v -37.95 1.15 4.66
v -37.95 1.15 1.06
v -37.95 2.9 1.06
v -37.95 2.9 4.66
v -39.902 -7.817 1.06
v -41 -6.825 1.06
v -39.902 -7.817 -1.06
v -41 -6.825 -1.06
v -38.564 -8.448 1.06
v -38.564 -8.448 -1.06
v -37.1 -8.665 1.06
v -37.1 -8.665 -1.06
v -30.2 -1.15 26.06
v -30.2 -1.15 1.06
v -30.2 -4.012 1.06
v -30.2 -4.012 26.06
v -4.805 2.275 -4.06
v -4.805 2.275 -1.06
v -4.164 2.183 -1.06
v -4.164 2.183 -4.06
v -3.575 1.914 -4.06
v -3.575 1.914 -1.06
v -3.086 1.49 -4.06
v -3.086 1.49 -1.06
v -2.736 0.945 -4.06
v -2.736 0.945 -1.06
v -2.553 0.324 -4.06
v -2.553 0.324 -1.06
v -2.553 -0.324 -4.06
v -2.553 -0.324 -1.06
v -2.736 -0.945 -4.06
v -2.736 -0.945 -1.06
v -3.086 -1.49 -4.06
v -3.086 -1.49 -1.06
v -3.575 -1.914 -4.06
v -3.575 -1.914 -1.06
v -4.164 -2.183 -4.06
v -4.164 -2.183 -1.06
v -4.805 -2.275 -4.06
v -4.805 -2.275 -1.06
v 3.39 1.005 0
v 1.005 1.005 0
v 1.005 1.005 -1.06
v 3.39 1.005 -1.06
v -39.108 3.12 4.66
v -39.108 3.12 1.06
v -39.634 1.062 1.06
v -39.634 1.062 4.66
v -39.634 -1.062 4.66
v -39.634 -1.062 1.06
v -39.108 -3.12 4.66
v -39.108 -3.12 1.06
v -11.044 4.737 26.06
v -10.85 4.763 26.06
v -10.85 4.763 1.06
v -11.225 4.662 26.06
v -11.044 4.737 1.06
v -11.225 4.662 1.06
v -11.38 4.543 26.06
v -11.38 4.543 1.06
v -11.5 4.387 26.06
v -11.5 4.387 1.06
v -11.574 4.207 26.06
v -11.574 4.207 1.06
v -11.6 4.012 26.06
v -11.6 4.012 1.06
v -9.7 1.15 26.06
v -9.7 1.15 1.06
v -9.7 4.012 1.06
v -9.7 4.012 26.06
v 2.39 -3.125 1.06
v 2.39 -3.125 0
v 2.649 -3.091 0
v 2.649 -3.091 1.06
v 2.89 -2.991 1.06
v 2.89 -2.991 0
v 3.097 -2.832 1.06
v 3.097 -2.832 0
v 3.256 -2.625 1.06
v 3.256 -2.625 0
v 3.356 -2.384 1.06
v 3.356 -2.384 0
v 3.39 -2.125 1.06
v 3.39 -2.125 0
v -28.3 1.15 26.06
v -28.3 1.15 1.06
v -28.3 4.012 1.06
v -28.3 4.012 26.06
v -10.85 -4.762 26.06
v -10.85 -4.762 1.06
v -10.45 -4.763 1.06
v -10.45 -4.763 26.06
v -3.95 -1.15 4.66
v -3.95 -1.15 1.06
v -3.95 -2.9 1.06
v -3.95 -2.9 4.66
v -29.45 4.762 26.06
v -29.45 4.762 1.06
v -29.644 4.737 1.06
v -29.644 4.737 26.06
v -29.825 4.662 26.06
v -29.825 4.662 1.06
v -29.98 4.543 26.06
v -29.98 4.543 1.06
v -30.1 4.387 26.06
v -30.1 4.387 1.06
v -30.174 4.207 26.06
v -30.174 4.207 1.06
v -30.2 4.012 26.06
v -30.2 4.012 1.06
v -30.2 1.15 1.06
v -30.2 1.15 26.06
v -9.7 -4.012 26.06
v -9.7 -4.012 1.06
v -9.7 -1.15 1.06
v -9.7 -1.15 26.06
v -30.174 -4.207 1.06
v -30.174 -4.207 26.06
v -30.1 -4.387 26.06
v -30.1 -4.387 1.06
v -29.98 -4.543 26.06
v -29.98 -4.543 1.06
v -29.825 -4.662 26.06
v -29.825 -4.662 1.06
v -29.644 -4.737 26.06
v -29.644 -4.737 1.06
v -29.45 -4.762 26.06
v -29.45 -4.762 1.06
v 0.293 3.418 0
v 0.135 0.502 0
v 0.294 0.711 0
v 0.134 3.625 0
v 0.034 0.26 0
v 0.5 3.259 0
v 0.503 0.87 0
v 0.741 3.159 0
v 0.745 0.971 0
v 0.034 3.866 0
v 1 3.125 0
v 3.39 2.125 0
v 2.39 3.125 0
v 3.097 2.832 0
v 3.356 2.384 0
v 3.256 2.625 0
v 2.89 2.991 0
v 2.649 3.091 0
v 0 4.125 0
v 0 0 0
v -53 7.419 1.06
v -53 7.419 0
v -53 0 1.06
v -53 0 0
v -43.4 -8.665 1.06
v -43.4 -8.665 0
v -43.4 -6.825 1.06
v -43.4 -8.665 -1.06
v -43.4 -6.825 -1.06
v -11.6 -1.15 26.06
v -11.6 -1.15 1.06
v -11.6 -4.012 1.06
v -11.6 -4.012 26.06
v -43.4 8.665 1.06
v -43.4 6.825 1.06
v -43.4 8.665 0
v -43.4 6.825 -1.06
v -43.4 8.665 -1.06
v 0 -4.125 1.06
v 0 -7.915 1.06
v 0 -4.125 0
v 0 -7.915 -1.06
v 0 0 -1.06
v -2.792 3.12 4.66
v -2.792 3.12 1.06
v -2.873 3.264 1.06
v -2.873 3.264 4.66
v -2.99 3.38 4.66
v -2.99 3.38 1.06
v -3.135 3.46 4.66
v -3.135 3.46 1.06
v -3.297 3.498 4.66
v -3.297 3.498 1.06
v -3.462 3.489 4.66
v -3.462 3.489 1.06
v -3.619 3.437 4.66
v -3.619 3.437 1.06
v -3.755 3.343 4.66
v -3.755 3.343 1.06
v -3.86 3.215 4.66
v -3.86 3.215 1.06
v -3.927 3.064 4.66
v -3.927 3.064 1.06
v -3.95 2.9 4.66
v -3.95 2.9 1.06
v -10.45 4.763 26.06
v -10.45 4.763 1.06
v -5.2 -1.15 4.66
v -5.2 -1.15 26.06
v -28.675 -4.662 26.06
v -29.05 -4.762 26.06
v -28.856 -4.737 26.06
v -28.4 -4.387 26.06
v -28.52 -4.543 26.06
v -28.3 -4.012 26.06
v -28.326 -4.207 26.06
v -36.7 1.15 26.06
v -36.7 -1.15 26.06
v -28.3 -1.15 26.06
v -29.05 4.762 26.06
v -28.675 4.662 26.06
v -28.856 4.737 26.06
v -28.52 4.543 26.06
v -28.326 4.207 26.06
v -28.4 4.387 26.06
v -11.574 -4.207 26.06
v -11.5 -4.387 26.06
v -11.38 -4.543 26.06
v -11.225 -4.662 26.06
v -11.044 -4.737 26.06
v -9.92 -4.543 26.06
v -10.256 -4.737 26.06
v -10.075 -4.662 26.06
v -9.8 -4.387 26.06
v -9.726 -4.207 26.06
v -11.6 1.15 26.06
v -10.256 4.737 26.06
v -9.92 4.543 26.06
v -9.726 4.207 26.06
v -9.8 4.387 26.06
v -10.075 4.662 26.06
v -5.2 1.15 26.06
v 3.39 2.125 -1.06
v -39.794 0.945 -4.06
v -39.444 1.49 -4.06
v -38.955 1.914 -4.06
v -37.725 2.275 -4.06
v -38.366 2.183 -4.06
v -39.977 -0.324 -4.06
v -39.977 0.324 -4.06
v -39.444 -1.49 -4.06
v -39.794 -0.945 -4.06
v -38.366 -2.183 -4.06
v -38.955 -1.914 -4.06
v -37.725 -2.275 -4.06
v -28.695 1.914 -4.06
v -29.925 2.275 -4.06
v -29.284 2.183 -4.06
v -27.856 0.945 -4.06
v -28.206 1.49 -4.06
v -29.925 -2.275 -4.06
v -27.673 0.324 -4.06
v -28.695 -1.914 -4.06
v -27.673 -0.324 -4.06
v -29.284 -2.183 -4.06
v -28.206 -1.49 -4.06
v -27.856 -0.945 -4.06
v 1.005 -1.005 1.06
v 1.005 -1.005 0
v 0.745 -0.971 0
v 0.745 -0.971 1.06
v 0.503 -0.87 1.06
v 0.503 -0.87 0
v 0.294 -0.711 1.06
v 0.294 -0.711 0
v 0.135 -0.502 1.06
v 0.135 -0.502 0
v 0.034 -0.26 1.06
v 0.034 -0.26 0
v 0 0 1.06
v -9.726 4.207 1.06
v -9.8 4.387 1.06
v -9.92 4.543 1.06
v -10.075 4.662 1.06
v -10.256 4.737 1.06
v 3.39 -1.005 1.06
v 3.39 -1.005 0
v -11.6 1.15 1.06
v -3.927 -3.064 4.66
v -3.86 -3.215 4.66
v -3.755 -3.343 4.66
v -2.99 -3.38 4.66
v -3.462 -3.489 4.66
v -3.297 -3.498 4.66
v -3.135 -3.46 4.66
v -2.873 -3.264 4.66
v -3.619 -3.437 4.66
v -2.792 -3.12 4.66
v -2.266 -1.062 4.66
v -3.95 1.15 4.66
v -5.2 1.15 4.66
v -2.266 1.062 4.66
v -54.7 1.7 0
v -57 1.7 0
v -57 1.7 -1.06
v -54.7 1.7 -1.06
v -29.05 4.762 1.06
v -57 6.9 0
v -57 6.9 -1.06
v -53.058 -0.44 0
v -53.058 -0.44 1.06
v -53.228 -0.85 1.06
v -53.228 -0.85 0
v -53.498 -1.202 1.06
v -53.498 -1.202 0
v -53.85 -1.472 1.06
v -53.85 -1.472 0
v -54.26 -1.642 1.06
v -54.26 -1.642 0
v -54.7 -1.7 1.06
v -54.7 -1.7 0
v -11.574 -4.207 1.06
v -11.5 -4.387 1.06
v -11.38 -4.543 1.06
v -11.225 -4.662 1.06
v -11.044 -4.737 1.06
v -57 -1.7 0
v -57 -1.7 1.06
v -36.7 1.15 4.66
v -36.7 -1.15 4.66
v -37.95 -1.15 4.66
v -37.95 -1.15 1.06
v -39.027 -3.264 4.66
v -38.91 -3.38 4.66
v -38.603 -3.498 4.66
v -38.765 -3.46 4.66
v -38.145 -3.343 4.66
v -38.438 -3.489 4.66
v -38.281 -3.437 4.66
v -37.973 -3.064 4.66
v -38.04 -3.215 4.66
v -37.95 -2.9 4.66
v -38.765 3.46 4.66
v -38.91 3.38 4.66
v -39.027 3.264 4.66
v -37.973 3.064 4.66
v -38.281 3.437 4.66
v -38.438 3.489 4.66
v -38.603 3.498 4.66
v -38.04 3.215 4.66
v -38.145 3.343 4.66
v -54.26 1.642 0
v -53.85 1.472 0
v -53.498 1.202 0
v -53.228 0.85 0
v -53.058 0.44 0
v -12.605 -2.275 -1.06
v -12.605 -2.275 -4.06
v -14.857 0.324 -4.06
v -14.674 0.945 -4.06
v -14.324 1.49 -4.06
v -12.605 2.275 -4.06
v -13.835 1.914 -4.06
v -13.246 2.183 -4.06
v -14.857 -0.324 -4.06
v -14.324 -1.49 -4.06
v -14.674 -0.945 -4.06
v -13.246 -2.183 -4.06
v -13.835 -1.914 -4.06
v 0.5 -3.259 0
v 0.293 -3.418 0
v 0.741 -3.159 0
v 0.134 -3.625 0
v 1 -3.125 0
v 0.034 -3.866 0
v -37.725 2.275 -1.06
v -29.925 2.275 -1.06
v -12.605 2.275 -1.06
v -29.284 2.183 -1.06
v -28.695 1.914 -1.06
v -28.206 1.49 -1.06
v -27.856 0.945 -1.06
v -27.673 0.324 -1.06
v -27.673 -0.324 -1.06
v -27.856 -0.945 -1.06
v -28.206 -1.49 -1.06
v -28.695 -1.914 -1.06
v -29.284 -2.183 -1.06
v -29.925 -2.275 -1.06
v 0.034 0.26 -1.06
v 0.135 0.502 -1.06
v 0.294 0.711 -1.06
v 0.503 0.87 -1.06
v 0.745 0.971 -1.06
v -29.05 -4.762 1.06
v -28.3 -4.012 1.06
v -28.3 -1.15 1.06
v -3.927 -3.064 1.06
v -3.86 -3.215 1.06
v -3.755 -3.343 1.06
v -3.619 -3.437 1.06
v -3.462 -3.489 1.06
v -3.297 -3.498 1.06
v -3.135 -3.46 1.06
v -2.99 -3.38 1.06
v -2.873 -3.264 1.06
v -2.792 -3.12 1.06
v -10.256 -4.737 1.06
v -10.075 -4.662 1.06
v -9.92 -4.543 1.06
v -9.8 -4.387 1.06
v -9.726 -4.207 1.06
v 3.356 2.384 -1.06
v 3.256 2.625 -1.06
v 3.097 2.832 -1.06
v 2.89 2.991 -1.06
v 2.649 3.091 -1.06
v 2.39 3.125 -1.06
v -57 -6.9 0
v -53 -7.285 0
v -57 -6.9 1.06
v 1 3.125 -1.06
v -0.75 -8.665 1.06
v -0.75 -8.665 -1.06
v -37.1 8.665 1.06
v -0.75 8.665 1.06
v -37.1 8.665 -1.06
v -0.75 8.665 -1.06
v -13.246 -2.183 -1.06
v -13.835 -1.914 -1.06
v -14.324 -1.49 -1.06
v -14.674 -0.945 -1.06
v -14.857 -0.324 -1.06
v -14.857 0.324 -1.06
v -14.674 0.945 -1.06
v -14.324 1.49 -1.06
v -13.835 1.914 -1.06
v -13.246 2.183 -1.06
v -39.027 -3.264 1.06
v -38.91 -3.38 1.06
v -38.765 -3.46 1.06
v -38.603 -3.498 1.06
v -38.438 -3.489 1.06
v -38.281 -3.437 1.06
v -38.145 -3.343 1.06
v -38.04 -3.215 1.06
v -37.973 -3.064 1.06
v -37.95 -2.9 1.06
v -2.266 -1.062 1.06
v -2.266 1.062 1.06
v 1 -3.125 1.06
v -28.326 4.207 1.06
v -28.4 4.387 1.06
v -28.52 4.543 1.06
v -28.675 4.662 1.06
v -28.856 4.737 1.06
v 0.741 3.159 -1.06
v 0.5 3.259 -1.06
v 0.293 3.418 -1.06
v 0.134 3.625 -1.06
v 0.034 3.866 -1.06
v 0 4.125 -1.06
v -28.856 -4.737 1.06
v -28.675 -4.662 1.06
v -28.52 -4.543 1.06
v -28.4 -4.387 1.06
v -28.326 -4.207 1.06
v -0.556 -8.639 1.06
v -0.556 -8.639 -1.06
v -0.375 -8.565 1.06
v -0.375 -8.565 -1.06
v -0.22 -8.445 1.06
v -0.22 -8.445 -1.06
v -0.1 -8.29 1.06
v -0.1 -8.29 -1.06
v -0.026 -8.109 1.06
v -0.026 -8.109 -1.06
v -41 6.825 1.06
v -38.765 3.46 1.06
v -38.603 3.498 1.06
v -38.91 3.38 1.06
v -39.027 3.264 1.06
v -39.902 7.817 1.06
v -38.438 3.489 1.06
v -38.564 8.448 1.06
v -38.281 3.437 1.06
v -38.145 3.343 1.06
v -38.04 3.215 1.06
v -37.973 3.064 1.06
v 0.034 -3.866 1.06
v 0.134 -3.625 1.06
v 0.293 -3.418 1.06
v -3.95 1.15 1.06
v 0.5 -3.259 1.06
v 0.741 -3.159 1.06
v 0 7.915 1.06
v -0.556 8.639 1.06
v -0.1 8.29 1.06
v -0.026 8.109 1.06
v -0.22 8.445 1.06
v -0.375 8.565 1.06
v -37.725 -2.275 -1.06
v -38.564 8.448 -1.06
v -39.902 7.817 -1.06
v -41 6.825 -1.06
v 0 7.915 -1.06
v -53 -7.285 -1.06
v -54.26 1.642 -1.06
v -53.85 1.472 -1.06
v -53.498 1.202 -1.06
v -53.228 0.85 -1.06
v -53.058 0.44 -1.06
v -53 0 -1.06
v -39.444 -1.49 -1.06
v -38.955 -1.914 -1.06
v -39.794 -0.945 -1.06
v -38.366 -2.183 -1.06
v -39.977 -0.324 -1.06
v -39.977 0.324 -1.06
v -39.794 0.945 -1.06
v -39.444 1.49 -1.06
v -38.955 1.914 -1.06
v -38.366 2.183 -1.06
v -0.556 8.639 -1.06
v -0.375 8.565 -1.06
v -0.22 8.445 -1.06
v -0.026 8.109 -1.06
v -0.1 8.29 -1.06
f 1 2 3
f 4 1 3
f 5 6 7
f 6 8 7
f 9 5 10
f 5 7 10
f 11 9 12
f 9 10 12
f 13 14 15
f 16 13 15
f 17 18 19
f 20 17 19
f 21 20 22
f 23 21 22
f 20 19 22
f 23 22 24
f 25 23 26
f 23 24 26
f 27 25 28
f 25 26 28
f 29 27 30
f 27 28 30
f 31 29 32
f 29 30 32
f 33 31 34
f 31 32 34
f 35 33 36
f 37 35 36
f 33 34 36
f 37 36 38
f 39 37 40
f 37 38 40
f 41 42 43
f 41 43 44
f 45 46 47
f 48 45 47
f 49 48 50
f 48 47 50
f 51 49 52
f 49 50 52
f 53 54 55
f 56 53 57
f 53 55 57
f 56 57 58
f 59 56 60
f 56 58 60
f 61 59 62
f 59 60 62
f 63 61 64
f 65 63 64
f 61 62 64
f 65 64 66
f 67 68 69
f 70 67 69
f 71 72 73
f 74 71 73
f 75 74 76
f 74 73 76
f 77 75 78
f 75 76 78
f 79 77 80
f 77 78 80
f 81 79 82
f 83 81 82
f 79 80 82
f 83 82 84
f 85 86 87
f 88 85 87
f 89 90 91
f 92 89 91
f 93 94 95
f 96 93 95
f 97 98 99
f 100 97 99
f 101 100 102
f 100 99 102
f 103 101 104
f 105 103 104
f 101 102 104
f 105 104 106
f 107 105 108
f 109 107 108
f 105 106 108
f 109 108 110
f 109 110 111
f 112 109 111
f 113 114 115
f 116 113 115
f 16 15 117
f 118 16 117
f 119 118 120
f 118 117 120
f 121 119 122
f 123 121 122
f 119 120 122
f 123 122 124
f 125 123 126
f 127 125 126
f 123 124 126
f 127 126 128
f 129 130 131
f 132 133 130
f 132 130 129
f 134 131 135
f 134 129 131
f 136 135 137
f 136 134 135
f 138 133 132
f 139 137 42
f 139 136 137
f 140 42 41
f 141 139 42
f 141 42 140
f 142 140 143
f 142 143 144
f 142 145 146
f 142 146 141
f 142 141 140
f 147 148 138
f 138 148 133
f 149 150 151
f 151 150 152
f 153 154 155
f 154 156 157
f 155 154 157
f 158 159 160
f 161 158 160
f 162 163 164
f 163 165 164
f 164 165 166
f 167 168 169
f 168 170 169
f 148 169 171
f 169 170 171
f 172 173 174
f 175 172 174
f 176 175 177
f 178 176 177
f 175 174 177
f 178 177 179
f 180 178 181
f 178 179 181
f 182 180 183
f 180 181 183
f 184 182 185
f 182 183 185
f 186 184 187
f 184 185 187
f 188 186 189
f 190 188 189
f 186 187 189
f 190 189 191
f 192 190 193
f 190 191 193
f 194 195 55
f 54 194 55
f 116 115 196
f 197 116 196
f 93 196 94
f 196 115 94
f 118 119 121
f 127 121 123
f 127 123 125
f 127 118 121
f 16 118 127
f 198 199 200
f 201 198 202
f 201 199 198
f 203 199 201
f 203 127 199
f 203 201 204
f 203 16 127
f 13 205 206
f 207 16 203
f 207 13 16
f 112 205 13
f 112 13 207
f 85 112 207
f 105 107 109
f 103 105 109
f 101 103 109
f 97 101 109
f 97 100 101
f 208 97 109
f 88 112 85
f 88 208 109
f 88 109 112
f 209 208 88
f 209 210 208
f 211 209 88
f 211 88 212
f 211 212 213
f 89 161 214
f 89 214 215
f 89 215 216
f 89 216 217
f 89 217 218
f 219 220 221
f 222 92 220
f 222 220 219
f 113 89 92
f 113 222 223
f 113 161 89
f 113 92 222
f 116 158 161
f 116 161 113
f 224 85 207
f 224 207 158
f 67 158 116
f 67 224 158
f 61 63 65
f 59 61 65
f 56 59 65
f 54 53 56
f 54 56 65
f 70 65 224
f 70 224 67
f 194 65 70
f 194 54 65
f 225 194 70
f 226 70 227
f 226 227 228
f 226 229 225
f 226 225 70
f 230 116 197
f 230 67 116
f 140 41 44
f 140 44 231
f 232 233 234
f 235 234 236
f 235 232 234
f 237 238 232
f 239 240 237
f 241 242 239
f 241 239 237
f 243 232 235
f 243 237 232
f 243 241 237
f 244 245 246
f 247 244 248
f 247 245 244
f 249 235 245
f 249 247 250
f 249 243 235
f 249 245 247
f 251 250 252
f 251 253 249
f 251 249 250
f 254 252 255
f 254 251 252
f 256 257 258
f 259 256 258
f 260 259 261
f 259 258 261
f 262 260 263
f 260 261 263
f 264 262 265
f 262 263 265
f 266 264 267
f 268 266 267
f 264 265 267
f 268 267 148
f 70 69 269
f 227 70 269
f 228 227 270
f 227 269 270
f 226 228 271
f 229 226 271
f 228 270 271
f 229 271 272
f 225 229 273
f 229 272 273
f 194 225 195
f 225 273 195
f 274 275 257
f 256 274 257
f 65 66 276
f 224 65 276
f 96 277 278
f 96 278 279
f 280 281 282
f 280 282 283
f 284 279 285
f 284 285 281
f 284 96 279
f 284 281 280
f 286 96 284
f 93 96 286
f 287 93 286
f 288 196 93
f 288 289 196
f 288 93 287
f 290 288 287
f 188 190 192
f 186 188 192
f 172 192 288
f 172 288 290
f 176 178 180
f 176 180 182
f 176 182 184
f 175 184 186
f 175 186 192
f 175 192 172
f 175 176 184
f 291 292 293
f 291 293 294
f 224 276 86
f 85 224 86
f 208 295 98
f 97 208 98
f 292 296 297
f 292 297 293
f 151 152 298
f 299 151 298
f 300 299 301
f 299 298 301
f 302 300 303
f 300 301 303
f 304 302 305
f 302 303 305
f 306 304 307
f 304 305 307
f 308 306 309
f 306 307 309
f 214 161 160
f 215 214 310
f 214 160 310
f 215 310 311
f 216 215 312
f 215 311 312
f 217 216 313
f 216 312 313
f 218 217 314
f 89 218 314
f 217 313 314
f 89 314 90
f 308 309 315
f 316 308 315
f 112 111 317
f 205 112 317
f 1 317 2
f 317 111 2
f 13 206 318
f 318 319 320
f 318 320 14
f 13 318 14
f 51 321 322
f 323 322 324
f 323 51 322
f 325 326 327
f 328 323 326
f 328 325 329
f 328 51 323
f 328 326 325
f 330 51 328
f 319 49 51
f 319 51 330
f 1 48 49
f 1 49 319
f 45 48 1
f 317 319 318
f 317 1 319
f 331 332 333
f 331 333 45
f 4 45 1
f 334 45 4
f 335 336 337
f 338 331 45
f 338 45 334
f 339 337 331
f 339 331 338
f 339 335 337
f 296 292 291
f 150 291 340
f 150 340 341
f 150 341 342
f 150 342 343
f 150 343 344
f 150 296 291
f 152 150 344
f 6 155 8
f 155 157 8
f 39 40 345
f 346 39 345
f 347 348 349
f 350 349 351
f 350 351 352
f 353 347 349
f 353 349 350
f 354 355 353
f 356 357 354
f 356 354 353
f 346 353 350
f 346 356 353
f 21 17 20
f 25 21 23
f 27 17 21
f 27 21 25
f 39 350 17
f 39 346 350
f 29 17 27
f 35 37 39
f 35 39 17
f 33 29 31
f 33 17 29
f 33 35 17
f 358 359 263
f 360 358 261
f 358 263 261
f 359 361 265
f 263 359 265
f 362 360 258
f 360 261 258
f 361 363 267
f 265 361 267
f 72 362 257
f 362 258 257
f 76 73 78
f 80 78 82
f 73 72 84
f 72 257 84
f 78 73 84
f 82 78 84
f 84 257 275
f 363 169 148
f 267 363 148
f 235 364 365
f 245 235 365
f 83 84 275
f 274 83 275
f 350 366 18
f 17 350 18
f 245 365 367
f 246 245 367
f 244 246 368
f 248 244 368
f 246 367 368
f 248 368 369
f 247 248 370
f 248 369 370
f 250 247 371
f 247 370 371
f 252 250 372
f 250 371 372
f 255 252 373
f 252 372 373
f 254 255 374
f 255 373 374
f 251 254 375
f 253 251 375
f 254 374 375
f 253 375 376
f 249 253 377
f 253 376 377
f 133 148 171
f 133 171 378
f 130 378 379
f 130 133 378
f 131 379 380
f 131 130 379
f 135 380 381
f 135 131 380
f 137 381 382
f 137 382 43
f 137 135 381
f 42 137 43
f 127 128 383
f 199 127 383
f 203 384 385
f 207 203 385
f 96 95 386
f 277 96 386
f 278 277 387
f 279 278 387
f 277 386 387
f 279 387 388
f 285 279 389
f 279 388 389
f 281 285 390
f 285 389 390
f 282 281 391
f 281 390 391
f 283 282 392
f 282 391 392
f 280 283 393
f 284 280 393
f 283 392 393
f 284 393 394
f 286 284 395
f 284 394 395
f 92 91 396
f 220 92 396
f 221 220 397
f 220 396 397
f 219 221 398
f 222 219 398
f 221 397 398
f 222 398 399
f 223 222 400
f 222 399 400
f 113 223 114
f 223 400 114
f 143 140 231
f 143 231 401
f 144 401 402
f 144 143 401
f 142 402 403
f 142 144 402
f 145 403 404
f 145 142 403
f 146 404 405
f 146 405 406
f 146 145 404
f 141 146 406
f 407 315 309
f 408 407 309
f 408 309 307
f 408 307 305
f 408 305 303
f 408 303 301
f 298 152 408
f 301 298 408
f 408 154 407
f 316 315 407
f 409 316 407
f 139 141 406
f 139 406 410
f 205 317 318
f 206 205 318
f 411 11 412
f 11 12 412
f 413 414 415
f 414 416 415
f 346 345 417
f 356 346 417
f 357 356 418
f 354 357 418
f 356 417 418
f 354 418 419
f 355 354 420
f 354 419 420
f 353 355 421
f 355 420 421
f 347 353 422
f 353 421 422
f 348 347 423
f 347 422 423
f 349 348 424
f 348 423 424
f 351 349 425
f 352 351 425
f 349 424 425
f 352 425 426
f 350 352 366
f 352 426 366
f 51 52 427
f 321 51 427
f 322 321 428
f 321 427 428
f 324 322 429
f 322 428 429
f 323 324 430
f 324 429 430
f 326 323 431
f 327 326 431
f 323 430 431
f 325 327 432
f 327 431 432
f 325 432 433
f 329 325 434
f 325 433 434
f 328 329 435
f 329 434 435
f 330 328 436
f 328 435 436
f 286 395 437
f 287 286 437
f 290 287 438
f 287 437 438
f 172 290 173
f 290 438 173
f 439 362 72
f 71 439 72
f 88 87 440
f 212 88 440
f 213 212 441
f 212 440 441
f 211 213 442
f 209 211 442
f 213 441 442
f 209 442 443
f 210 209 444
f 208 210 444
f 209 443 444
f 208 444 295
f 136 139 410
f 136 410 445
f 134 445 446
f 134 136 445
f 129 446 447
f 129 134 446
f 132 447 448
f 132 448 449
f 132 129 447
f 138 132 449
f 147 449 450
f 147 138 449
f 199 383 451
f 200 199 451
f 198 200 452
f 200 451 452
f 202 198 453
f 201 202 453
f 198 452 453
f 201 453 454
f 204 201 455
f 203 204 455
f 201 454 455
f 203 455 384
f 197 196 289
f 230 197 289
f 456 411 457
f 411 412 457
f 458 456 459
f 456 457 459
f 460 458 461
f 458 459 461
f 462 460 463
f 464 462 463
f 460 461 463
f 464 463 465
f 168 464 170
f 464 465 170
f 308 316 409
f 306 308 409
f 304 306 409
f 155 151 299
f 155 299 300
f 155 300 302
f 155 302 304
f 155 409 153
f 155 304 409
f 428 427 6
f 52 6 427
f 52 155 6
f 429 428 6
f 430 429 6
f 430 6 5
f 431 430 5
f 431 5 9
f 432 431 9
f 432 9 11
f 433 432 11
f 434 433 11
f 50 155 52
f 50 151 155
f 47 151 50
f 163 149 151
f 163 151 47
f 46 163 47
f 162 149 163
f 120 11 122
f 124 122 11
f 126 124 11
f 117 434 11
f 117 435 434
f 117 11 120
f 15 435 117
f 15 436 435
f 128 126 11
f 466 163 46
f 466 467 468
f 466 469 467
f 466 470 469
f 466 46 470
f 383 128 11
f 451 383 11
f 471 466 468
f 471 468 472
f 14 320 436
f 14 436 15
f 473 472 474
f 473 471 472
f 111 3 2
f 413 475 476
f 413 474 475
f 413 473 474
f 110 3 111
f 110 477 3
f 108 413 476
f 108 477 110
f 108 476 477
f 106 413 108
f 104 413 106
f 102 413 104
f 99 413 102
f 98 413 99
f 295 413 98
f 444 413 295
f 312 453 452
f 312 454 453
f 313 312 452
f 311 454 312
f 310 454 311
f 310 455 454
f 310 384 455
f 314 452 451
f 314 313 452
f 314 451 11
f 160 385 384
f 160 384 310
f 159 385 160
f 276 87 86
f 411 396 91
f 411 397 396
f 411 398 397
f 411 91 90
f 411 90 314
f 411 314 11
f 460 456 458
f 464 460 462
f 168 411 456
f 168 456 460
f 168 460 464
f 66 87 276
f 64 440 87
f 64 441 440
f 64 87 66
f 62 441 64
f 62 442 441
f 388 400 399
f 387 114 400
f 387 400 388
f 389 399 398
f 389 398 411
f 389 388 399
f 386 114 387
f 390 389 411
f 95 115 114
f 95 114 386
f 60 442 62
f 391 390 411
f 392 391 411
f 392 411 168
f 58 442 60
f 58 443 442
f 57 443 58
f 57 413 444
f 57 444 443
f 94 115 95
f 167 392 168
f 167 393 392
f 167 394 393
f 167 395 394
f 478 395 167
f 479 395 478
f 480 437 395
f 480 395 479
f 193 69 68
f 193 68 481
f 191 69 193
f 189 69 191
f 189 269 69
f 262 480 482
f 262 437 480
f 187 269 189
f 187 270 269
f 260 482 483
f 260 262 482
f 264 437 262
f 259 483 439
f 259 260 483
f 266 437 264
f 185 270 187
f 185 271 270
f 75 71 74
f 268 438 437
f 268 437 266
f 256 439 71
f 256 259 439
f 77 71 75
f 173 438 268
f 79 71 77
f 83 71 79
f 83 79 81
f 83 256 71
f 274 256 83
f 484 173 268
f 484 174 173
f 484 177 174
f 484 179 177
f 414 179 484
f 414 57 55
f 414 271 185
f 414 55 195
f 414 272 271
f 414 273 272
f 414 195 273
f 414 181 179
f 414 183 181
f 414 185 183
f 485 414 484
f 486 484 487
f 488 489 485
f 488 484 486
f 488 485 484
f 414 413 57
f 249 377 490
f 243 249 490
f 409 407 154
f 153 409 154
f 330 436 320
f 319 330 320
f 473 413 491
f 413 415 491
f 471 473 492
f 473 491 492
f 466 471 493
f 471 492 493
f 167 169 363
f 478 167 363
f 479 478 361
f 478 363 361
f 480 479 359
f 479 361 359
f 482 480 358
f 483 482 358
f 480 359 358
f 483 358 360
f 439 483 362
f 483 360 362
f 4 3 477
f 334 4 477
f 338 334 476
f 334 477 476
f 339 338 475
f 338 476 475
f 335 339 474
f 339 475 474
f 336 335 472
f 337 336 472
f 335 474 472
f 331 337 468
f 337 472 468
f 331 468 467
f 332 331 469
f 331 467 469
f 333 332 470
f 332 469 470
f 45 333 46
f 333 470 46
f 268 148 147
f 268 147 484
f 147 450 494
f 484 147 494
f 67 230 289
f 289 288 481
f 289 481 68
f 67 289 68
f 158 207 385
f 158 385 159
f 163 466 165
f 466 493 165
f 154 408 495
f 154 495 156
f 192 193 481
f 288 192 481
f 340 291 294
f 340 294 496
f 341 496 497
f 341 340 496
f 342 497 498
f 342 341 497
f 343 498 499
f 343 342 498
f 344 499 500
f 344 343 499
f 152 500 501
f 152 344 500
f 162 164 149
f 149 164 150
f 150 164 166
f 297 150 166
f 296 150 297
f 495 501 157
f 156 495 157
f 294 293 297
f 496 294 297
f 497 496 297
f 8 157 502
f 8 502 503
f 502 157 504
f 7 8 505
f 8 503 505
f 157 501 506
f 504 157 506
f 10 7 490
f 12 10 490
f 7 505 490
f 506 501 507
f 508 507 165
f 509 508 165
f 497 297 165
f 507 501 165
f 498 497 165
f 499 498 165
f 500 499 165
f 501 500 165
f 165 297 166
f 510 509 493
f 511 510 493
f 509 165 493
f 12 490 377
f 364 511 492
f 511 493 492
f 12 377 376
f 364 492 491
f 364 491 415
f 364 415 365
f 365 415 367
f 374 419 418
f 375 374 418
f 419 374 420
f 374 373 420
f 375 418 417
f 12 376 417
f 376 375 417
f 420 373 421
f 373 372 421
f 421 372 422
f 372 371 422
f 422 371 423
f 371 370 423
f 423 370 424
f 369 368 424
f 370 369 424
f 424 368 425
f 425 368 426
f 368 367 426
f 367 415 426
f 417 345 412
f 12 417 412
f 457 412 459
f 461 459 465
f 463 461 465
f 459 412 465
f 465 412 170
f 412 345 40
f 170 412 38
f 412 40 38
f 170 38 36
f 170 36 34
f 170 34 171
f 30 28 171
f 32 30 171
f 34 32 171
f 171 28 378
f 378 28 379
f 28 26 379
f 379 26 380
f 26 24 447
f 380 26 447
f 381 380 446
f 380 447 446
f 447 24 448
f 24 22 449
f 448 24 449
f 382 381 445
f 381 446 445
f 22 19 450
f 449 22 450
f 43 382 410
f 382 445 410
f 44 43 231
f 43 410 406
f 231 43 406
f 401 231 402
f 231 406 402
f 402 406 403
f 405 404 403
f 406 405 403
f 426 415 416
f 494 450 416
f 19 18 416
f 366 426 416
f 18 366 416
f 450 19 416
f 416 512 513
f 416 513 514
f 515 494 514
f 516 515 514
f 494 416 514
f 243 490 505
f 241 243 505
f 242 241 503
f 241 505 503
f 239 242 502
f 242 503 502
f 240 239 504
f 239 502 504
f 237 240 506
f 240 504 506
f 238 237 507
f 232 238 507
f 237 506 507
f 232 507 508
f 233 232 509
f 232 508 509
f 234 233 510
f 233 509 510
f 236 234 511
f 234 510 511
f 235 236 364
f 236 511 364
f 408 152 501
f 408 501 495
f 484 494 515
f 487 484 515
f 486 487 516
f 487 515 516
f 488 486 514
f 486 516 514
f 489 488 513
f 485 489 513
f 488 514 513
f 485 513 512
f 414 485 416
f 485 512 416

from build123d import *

# Parameters (mm, degrees)
F1_DEPTH = 1.06
F3_DEPTH = 1.06
F5_DEPTH = 3
F7_DEPTH = 25
F9_DEPTH = 3.6


with BuildPart() as f1:
    # F0 (on Top) → F1 (new body)
    with BuildSketch(Plane.XY):
        with BuildLine():
            ThreePointArc((-41, -6.825), (-39.256131, -8.181908), (-37.1, -8.665))
            Line((-37.1, -8.665), (-0.75, -8.665))
            ThreePointArc((-0.75, -8.665), (-0.21967, -8.44533), (0, -7.915))
            Line((0, -7.915), (0, 0))
            ThreePointArc((0, 0), (0.294358, 0.710642), (1.005, 1.005))
            Line((1.005, 1.005), (3.39, 1.005))
            Line((3.39, 1.005), (3.39, 2.125))
            ThreePointArc((3.39, 2.125), (3.097107, 2.832107), (2.39, 3.125))
            Line((2.39, 3.125), (1, 3.125))
            ThreePointArc((1, 3.125), (0.292893, 3.417893), (0, 4.125))
            Line((0, 4.125), (0, 7.915))
            ThreePointArc((0, 7.915), (-0.21967, 8.44533), (-0.75, 8.665))
            Line((-0.75, 8.665), (-37.1, 8.665))
            ThreePointArc((-37.1, 8.665), (-39.256131, 8.181908), (-41, 6.825))
            Line((-41, 6.825), (-43.4, 6.825))
            Line((-43.4, 6.825), (-43.4, 8.665))
            Line((-43.4, 8.665), (-57, 6.9))
            Line((-57, 6.9), (-57, 1.7))
            Line((-57, 1.7), (-54.7, 1.7))
            ThreePointArc((-54.7, 1.7), (-53.497918, 1.202082), (-53, 0))
            Line((-53, 0), (-53, -7.285))
            Line((-53, -7.285), (-43.4, -8.665))
            Line((-43.4, -8.665), (-43.4, -6.825))
            Line((-43.4, -6.825), (-41, -6.825))
        make_face()
    extrude(amount=-F1_DEPTH)

    # F2 (on face) → F3 (join)
    with BuildSketch(Plane.XY):
        with BuildLine():
            ThreePointArc((0, 7.915), (-0.21967, 8.44533), (-0.75, 8.665))
            Line((-0.75, 8.665), (-37.1, 8.665))
            ThreePointArc((-37.1, 8.665), (-39.256131, 8.181908), (-41, 6.825))
            Line((-41, 6.825), (-43.4, 6.825))
            Line((-43.4, 6.825), (-43.4, 8.665))
            Line((-43.4, 8.665), (-53, 7.419118))
            Line((-53, 7.419118), (-53, 0))
            ThreePointArc((-53, 0), (-53.497918, -1.202082), (-54.7, -1.7))
            Line((-54.7, -1.7), (-57, -1.7))
            Line((-57, -1.7), (-57, -6.9))
            Line((-57, -6.9), (-43.4, -8.665))
            Line((-43.4, -8.665), (-43.4, -6.825))
            Line((-43.4, -6.825), (-41, -6.825))
            ThreePointArc((-41, -6.825), (-39.256131, -8.181908), (-37.1, -8.665))
            Line((-37.1, -8.665), (-0.75, -8.665))
            ThreePointArc((-0.75, -8.665), (-0.21967, -8.44533), (0, -7.915))
            Line((0, -7.915), (0, -4.125))
            ThreePointArc((0, -4.125), (0.292893, -3.417893), (1, -3.125))
            Line((1, -3.125), (2.39, -3.125))
            ThreePointArc((2.39, -3.125), (3.097107, -2.832107), (3.39, -2.125))
            Line((3.39, -2.125), (3.39, -1.005))
            Line((3.39, -1.005), (1.005, -1.005))
            ThreePointArc((1.005, -1.005), (0.294358, -0.710642), (0, 0))
            Line((0, 0), (0, 7.915))
        make_face()
    extrude(amount=F3_DEPTH)

    # F4 (on face) → F5 (join)
    with BuildSketch(Plane(origin=(0, 0, -1.06), x_dir=(1, 0, 0), z_dir=(0, 0, -1))):
        with BuildLine():
            Line((-29.925, 2.275), (-37.725, 2.275))
            ThreePointArc((-37.725, 2.275), (-40, 0), (-37.725, -2.275))
            Line((-37.725, -2.275), (-29.925, -2.275))
            ThreePointArc((-29.925, -2.275), (-27.65, 0), (-29.925, 2.275))
        make_face()
        with BuildLine():
            Line((-4.805, 2.275), (-12.605, 2.275))
            ThreePointArc((-12.605, 2.275), (-14.88, 0), (-12.605, -2.275))
            Line((-12.605, -2.275), (-4.805, -2.275))
            ThreePointArc((-4.805, -2.275), (-2.53, 0), (-4.805, 2.275))
        make_face()
    extrude(amount=F5_DEPTH)

    # F6 (on face) → F7 (join)
    with BuildSketch(Plane.XY.offset(1.06)):
        with BuildLine():
            Line((-30.2, 1.15), (-36.7, 1.15))
            Line((-36.7, 1.15), (-36.7, -1.15))
            Line((-36.7, -1.15), (-30.2, -1.15))
            Line((-30.2, -1.15), (-30.2, -4.0125))
            ThreePointArc((-30.2, -4.0125), (-29.98033, -4.54283), (-29.45, -4.7625))
            Line((-29.45, -4.7625), (-29.05, -4.7625))
            ThreePointArc((-29.05, -4.7625), (-28.51967, -4.54283), (-28.3, -4.0125))
            Line((-28.3, -4.0125), (-28.3, -1.15))
            Line((-28.3, -1.15), (-11.6, -1.15))
            Line((-11.6, -1.15), (-11.6, -4.0125))
            ThreePointArc((-11.6, -4.0125), (-11.38033, -4.54283), (-10.85, -4.7625))
            Line((-10.85, -4.7625), (-10.45, -4.7625))
            ThreePointArc((-10.45, -4.7625), (-9.91967, -4.54283), (-9.7, -4.0125))
            Line((-9.7, -4.0125), (-9.7, -1.15))
            Line((-9.7, -1.15), (-5.2, -1.15))
            Line((-5.2, -1.15), (-5.2, 1.15))
            Line((-5.2, 1.15), (-9.7, 1.15))
            Line((-9.7, 1.15), (-9.7, 4.0125))
            ThreePointArc((-9.7, 4.0125), (-9.91967, 4.54283), (-10.45, 4.7625))
            Line((-10.45, 4.7625), (-10.85, 4.7625))
            ThreePointArc((-10.85, 4.7625), (-11.38033, 4.54283), (-11.6, 4.0125))
            Line((-11.6, 4.0125), (-11.6, 1.15))
            Line((-11.6, 1.15), (-28.3, 1.15))
            Line((-28.3, 1.15), (-28.3, 4.0125))
            ThreePointArc((-28.3, 4.0125), (-28.51967, 4.54283), (-29.05, 4.7625))
            Line((-29.05, 4.7625), (-29.45, 4.7625))
            ThreePointArc((-29.45, 4.7625), (-29.98033, 4.54283), (-30.2, 4.0125))
            Line((-30.2, 4.0125), (-30.2, 1.15))
        make_face()
    extrude(amount=F7_DEPTH)

    # F8 (on face) → F9 (join)
    with BuildSketch(Plane.XY.offset(1.06)):
        with BuildLine():
            Line((-37.95, 1.15), (-37.95, 2.9))
            ThreePointArc((-37.95, 2.9), (-38.4382, 3.489492), (-39.108336, 3.119684))
            ThreePointArc((-39.108336, 3.119684), (-39.7, 0), (-39.108336, -3.119684))
            ThreePointArc((-39.108336, -3.119684), (-38.4382, -3.489492), (-37.95, -2.9))
            Line((-37.95, -2.9), (-37.95, -1.15))
            Line((-37.95, -1.15), (-36.7, -1.15))
            Line((-36.7, -1.15), (-36.7, 1.15))
            Line((-36.7, 1.15), (-37.95, 1.15))
        make_face()
        with BuildLine():
            Line((-5.2, -1.15), (-3.95, -1.15))
            Line((-3.95, -1.15), (-3.95, -2.9))
            ThreePointArc((-3.95, -2.9), (-3.4618, -3.489492), (-2.791664, -3.119684))
            ThreePointArc((-2.791664, -3.119684), (-2.2, 0), (-2.791664, 3.119684))
            ThreePointArc((-2.791664, 3.119684), (-3.4618, 3.489492), (-3.95, 2.9))
            Line((-3.95, 2.9), (-3.95, 1.15))
            Line((-3.95, 1.15), (-5.2, 1.15))
            Line((-5.2, 1.15), (-5.2, -1.15))
        make_face()
    extrude(amount=F9_DEPTH)


solid = f1.part
